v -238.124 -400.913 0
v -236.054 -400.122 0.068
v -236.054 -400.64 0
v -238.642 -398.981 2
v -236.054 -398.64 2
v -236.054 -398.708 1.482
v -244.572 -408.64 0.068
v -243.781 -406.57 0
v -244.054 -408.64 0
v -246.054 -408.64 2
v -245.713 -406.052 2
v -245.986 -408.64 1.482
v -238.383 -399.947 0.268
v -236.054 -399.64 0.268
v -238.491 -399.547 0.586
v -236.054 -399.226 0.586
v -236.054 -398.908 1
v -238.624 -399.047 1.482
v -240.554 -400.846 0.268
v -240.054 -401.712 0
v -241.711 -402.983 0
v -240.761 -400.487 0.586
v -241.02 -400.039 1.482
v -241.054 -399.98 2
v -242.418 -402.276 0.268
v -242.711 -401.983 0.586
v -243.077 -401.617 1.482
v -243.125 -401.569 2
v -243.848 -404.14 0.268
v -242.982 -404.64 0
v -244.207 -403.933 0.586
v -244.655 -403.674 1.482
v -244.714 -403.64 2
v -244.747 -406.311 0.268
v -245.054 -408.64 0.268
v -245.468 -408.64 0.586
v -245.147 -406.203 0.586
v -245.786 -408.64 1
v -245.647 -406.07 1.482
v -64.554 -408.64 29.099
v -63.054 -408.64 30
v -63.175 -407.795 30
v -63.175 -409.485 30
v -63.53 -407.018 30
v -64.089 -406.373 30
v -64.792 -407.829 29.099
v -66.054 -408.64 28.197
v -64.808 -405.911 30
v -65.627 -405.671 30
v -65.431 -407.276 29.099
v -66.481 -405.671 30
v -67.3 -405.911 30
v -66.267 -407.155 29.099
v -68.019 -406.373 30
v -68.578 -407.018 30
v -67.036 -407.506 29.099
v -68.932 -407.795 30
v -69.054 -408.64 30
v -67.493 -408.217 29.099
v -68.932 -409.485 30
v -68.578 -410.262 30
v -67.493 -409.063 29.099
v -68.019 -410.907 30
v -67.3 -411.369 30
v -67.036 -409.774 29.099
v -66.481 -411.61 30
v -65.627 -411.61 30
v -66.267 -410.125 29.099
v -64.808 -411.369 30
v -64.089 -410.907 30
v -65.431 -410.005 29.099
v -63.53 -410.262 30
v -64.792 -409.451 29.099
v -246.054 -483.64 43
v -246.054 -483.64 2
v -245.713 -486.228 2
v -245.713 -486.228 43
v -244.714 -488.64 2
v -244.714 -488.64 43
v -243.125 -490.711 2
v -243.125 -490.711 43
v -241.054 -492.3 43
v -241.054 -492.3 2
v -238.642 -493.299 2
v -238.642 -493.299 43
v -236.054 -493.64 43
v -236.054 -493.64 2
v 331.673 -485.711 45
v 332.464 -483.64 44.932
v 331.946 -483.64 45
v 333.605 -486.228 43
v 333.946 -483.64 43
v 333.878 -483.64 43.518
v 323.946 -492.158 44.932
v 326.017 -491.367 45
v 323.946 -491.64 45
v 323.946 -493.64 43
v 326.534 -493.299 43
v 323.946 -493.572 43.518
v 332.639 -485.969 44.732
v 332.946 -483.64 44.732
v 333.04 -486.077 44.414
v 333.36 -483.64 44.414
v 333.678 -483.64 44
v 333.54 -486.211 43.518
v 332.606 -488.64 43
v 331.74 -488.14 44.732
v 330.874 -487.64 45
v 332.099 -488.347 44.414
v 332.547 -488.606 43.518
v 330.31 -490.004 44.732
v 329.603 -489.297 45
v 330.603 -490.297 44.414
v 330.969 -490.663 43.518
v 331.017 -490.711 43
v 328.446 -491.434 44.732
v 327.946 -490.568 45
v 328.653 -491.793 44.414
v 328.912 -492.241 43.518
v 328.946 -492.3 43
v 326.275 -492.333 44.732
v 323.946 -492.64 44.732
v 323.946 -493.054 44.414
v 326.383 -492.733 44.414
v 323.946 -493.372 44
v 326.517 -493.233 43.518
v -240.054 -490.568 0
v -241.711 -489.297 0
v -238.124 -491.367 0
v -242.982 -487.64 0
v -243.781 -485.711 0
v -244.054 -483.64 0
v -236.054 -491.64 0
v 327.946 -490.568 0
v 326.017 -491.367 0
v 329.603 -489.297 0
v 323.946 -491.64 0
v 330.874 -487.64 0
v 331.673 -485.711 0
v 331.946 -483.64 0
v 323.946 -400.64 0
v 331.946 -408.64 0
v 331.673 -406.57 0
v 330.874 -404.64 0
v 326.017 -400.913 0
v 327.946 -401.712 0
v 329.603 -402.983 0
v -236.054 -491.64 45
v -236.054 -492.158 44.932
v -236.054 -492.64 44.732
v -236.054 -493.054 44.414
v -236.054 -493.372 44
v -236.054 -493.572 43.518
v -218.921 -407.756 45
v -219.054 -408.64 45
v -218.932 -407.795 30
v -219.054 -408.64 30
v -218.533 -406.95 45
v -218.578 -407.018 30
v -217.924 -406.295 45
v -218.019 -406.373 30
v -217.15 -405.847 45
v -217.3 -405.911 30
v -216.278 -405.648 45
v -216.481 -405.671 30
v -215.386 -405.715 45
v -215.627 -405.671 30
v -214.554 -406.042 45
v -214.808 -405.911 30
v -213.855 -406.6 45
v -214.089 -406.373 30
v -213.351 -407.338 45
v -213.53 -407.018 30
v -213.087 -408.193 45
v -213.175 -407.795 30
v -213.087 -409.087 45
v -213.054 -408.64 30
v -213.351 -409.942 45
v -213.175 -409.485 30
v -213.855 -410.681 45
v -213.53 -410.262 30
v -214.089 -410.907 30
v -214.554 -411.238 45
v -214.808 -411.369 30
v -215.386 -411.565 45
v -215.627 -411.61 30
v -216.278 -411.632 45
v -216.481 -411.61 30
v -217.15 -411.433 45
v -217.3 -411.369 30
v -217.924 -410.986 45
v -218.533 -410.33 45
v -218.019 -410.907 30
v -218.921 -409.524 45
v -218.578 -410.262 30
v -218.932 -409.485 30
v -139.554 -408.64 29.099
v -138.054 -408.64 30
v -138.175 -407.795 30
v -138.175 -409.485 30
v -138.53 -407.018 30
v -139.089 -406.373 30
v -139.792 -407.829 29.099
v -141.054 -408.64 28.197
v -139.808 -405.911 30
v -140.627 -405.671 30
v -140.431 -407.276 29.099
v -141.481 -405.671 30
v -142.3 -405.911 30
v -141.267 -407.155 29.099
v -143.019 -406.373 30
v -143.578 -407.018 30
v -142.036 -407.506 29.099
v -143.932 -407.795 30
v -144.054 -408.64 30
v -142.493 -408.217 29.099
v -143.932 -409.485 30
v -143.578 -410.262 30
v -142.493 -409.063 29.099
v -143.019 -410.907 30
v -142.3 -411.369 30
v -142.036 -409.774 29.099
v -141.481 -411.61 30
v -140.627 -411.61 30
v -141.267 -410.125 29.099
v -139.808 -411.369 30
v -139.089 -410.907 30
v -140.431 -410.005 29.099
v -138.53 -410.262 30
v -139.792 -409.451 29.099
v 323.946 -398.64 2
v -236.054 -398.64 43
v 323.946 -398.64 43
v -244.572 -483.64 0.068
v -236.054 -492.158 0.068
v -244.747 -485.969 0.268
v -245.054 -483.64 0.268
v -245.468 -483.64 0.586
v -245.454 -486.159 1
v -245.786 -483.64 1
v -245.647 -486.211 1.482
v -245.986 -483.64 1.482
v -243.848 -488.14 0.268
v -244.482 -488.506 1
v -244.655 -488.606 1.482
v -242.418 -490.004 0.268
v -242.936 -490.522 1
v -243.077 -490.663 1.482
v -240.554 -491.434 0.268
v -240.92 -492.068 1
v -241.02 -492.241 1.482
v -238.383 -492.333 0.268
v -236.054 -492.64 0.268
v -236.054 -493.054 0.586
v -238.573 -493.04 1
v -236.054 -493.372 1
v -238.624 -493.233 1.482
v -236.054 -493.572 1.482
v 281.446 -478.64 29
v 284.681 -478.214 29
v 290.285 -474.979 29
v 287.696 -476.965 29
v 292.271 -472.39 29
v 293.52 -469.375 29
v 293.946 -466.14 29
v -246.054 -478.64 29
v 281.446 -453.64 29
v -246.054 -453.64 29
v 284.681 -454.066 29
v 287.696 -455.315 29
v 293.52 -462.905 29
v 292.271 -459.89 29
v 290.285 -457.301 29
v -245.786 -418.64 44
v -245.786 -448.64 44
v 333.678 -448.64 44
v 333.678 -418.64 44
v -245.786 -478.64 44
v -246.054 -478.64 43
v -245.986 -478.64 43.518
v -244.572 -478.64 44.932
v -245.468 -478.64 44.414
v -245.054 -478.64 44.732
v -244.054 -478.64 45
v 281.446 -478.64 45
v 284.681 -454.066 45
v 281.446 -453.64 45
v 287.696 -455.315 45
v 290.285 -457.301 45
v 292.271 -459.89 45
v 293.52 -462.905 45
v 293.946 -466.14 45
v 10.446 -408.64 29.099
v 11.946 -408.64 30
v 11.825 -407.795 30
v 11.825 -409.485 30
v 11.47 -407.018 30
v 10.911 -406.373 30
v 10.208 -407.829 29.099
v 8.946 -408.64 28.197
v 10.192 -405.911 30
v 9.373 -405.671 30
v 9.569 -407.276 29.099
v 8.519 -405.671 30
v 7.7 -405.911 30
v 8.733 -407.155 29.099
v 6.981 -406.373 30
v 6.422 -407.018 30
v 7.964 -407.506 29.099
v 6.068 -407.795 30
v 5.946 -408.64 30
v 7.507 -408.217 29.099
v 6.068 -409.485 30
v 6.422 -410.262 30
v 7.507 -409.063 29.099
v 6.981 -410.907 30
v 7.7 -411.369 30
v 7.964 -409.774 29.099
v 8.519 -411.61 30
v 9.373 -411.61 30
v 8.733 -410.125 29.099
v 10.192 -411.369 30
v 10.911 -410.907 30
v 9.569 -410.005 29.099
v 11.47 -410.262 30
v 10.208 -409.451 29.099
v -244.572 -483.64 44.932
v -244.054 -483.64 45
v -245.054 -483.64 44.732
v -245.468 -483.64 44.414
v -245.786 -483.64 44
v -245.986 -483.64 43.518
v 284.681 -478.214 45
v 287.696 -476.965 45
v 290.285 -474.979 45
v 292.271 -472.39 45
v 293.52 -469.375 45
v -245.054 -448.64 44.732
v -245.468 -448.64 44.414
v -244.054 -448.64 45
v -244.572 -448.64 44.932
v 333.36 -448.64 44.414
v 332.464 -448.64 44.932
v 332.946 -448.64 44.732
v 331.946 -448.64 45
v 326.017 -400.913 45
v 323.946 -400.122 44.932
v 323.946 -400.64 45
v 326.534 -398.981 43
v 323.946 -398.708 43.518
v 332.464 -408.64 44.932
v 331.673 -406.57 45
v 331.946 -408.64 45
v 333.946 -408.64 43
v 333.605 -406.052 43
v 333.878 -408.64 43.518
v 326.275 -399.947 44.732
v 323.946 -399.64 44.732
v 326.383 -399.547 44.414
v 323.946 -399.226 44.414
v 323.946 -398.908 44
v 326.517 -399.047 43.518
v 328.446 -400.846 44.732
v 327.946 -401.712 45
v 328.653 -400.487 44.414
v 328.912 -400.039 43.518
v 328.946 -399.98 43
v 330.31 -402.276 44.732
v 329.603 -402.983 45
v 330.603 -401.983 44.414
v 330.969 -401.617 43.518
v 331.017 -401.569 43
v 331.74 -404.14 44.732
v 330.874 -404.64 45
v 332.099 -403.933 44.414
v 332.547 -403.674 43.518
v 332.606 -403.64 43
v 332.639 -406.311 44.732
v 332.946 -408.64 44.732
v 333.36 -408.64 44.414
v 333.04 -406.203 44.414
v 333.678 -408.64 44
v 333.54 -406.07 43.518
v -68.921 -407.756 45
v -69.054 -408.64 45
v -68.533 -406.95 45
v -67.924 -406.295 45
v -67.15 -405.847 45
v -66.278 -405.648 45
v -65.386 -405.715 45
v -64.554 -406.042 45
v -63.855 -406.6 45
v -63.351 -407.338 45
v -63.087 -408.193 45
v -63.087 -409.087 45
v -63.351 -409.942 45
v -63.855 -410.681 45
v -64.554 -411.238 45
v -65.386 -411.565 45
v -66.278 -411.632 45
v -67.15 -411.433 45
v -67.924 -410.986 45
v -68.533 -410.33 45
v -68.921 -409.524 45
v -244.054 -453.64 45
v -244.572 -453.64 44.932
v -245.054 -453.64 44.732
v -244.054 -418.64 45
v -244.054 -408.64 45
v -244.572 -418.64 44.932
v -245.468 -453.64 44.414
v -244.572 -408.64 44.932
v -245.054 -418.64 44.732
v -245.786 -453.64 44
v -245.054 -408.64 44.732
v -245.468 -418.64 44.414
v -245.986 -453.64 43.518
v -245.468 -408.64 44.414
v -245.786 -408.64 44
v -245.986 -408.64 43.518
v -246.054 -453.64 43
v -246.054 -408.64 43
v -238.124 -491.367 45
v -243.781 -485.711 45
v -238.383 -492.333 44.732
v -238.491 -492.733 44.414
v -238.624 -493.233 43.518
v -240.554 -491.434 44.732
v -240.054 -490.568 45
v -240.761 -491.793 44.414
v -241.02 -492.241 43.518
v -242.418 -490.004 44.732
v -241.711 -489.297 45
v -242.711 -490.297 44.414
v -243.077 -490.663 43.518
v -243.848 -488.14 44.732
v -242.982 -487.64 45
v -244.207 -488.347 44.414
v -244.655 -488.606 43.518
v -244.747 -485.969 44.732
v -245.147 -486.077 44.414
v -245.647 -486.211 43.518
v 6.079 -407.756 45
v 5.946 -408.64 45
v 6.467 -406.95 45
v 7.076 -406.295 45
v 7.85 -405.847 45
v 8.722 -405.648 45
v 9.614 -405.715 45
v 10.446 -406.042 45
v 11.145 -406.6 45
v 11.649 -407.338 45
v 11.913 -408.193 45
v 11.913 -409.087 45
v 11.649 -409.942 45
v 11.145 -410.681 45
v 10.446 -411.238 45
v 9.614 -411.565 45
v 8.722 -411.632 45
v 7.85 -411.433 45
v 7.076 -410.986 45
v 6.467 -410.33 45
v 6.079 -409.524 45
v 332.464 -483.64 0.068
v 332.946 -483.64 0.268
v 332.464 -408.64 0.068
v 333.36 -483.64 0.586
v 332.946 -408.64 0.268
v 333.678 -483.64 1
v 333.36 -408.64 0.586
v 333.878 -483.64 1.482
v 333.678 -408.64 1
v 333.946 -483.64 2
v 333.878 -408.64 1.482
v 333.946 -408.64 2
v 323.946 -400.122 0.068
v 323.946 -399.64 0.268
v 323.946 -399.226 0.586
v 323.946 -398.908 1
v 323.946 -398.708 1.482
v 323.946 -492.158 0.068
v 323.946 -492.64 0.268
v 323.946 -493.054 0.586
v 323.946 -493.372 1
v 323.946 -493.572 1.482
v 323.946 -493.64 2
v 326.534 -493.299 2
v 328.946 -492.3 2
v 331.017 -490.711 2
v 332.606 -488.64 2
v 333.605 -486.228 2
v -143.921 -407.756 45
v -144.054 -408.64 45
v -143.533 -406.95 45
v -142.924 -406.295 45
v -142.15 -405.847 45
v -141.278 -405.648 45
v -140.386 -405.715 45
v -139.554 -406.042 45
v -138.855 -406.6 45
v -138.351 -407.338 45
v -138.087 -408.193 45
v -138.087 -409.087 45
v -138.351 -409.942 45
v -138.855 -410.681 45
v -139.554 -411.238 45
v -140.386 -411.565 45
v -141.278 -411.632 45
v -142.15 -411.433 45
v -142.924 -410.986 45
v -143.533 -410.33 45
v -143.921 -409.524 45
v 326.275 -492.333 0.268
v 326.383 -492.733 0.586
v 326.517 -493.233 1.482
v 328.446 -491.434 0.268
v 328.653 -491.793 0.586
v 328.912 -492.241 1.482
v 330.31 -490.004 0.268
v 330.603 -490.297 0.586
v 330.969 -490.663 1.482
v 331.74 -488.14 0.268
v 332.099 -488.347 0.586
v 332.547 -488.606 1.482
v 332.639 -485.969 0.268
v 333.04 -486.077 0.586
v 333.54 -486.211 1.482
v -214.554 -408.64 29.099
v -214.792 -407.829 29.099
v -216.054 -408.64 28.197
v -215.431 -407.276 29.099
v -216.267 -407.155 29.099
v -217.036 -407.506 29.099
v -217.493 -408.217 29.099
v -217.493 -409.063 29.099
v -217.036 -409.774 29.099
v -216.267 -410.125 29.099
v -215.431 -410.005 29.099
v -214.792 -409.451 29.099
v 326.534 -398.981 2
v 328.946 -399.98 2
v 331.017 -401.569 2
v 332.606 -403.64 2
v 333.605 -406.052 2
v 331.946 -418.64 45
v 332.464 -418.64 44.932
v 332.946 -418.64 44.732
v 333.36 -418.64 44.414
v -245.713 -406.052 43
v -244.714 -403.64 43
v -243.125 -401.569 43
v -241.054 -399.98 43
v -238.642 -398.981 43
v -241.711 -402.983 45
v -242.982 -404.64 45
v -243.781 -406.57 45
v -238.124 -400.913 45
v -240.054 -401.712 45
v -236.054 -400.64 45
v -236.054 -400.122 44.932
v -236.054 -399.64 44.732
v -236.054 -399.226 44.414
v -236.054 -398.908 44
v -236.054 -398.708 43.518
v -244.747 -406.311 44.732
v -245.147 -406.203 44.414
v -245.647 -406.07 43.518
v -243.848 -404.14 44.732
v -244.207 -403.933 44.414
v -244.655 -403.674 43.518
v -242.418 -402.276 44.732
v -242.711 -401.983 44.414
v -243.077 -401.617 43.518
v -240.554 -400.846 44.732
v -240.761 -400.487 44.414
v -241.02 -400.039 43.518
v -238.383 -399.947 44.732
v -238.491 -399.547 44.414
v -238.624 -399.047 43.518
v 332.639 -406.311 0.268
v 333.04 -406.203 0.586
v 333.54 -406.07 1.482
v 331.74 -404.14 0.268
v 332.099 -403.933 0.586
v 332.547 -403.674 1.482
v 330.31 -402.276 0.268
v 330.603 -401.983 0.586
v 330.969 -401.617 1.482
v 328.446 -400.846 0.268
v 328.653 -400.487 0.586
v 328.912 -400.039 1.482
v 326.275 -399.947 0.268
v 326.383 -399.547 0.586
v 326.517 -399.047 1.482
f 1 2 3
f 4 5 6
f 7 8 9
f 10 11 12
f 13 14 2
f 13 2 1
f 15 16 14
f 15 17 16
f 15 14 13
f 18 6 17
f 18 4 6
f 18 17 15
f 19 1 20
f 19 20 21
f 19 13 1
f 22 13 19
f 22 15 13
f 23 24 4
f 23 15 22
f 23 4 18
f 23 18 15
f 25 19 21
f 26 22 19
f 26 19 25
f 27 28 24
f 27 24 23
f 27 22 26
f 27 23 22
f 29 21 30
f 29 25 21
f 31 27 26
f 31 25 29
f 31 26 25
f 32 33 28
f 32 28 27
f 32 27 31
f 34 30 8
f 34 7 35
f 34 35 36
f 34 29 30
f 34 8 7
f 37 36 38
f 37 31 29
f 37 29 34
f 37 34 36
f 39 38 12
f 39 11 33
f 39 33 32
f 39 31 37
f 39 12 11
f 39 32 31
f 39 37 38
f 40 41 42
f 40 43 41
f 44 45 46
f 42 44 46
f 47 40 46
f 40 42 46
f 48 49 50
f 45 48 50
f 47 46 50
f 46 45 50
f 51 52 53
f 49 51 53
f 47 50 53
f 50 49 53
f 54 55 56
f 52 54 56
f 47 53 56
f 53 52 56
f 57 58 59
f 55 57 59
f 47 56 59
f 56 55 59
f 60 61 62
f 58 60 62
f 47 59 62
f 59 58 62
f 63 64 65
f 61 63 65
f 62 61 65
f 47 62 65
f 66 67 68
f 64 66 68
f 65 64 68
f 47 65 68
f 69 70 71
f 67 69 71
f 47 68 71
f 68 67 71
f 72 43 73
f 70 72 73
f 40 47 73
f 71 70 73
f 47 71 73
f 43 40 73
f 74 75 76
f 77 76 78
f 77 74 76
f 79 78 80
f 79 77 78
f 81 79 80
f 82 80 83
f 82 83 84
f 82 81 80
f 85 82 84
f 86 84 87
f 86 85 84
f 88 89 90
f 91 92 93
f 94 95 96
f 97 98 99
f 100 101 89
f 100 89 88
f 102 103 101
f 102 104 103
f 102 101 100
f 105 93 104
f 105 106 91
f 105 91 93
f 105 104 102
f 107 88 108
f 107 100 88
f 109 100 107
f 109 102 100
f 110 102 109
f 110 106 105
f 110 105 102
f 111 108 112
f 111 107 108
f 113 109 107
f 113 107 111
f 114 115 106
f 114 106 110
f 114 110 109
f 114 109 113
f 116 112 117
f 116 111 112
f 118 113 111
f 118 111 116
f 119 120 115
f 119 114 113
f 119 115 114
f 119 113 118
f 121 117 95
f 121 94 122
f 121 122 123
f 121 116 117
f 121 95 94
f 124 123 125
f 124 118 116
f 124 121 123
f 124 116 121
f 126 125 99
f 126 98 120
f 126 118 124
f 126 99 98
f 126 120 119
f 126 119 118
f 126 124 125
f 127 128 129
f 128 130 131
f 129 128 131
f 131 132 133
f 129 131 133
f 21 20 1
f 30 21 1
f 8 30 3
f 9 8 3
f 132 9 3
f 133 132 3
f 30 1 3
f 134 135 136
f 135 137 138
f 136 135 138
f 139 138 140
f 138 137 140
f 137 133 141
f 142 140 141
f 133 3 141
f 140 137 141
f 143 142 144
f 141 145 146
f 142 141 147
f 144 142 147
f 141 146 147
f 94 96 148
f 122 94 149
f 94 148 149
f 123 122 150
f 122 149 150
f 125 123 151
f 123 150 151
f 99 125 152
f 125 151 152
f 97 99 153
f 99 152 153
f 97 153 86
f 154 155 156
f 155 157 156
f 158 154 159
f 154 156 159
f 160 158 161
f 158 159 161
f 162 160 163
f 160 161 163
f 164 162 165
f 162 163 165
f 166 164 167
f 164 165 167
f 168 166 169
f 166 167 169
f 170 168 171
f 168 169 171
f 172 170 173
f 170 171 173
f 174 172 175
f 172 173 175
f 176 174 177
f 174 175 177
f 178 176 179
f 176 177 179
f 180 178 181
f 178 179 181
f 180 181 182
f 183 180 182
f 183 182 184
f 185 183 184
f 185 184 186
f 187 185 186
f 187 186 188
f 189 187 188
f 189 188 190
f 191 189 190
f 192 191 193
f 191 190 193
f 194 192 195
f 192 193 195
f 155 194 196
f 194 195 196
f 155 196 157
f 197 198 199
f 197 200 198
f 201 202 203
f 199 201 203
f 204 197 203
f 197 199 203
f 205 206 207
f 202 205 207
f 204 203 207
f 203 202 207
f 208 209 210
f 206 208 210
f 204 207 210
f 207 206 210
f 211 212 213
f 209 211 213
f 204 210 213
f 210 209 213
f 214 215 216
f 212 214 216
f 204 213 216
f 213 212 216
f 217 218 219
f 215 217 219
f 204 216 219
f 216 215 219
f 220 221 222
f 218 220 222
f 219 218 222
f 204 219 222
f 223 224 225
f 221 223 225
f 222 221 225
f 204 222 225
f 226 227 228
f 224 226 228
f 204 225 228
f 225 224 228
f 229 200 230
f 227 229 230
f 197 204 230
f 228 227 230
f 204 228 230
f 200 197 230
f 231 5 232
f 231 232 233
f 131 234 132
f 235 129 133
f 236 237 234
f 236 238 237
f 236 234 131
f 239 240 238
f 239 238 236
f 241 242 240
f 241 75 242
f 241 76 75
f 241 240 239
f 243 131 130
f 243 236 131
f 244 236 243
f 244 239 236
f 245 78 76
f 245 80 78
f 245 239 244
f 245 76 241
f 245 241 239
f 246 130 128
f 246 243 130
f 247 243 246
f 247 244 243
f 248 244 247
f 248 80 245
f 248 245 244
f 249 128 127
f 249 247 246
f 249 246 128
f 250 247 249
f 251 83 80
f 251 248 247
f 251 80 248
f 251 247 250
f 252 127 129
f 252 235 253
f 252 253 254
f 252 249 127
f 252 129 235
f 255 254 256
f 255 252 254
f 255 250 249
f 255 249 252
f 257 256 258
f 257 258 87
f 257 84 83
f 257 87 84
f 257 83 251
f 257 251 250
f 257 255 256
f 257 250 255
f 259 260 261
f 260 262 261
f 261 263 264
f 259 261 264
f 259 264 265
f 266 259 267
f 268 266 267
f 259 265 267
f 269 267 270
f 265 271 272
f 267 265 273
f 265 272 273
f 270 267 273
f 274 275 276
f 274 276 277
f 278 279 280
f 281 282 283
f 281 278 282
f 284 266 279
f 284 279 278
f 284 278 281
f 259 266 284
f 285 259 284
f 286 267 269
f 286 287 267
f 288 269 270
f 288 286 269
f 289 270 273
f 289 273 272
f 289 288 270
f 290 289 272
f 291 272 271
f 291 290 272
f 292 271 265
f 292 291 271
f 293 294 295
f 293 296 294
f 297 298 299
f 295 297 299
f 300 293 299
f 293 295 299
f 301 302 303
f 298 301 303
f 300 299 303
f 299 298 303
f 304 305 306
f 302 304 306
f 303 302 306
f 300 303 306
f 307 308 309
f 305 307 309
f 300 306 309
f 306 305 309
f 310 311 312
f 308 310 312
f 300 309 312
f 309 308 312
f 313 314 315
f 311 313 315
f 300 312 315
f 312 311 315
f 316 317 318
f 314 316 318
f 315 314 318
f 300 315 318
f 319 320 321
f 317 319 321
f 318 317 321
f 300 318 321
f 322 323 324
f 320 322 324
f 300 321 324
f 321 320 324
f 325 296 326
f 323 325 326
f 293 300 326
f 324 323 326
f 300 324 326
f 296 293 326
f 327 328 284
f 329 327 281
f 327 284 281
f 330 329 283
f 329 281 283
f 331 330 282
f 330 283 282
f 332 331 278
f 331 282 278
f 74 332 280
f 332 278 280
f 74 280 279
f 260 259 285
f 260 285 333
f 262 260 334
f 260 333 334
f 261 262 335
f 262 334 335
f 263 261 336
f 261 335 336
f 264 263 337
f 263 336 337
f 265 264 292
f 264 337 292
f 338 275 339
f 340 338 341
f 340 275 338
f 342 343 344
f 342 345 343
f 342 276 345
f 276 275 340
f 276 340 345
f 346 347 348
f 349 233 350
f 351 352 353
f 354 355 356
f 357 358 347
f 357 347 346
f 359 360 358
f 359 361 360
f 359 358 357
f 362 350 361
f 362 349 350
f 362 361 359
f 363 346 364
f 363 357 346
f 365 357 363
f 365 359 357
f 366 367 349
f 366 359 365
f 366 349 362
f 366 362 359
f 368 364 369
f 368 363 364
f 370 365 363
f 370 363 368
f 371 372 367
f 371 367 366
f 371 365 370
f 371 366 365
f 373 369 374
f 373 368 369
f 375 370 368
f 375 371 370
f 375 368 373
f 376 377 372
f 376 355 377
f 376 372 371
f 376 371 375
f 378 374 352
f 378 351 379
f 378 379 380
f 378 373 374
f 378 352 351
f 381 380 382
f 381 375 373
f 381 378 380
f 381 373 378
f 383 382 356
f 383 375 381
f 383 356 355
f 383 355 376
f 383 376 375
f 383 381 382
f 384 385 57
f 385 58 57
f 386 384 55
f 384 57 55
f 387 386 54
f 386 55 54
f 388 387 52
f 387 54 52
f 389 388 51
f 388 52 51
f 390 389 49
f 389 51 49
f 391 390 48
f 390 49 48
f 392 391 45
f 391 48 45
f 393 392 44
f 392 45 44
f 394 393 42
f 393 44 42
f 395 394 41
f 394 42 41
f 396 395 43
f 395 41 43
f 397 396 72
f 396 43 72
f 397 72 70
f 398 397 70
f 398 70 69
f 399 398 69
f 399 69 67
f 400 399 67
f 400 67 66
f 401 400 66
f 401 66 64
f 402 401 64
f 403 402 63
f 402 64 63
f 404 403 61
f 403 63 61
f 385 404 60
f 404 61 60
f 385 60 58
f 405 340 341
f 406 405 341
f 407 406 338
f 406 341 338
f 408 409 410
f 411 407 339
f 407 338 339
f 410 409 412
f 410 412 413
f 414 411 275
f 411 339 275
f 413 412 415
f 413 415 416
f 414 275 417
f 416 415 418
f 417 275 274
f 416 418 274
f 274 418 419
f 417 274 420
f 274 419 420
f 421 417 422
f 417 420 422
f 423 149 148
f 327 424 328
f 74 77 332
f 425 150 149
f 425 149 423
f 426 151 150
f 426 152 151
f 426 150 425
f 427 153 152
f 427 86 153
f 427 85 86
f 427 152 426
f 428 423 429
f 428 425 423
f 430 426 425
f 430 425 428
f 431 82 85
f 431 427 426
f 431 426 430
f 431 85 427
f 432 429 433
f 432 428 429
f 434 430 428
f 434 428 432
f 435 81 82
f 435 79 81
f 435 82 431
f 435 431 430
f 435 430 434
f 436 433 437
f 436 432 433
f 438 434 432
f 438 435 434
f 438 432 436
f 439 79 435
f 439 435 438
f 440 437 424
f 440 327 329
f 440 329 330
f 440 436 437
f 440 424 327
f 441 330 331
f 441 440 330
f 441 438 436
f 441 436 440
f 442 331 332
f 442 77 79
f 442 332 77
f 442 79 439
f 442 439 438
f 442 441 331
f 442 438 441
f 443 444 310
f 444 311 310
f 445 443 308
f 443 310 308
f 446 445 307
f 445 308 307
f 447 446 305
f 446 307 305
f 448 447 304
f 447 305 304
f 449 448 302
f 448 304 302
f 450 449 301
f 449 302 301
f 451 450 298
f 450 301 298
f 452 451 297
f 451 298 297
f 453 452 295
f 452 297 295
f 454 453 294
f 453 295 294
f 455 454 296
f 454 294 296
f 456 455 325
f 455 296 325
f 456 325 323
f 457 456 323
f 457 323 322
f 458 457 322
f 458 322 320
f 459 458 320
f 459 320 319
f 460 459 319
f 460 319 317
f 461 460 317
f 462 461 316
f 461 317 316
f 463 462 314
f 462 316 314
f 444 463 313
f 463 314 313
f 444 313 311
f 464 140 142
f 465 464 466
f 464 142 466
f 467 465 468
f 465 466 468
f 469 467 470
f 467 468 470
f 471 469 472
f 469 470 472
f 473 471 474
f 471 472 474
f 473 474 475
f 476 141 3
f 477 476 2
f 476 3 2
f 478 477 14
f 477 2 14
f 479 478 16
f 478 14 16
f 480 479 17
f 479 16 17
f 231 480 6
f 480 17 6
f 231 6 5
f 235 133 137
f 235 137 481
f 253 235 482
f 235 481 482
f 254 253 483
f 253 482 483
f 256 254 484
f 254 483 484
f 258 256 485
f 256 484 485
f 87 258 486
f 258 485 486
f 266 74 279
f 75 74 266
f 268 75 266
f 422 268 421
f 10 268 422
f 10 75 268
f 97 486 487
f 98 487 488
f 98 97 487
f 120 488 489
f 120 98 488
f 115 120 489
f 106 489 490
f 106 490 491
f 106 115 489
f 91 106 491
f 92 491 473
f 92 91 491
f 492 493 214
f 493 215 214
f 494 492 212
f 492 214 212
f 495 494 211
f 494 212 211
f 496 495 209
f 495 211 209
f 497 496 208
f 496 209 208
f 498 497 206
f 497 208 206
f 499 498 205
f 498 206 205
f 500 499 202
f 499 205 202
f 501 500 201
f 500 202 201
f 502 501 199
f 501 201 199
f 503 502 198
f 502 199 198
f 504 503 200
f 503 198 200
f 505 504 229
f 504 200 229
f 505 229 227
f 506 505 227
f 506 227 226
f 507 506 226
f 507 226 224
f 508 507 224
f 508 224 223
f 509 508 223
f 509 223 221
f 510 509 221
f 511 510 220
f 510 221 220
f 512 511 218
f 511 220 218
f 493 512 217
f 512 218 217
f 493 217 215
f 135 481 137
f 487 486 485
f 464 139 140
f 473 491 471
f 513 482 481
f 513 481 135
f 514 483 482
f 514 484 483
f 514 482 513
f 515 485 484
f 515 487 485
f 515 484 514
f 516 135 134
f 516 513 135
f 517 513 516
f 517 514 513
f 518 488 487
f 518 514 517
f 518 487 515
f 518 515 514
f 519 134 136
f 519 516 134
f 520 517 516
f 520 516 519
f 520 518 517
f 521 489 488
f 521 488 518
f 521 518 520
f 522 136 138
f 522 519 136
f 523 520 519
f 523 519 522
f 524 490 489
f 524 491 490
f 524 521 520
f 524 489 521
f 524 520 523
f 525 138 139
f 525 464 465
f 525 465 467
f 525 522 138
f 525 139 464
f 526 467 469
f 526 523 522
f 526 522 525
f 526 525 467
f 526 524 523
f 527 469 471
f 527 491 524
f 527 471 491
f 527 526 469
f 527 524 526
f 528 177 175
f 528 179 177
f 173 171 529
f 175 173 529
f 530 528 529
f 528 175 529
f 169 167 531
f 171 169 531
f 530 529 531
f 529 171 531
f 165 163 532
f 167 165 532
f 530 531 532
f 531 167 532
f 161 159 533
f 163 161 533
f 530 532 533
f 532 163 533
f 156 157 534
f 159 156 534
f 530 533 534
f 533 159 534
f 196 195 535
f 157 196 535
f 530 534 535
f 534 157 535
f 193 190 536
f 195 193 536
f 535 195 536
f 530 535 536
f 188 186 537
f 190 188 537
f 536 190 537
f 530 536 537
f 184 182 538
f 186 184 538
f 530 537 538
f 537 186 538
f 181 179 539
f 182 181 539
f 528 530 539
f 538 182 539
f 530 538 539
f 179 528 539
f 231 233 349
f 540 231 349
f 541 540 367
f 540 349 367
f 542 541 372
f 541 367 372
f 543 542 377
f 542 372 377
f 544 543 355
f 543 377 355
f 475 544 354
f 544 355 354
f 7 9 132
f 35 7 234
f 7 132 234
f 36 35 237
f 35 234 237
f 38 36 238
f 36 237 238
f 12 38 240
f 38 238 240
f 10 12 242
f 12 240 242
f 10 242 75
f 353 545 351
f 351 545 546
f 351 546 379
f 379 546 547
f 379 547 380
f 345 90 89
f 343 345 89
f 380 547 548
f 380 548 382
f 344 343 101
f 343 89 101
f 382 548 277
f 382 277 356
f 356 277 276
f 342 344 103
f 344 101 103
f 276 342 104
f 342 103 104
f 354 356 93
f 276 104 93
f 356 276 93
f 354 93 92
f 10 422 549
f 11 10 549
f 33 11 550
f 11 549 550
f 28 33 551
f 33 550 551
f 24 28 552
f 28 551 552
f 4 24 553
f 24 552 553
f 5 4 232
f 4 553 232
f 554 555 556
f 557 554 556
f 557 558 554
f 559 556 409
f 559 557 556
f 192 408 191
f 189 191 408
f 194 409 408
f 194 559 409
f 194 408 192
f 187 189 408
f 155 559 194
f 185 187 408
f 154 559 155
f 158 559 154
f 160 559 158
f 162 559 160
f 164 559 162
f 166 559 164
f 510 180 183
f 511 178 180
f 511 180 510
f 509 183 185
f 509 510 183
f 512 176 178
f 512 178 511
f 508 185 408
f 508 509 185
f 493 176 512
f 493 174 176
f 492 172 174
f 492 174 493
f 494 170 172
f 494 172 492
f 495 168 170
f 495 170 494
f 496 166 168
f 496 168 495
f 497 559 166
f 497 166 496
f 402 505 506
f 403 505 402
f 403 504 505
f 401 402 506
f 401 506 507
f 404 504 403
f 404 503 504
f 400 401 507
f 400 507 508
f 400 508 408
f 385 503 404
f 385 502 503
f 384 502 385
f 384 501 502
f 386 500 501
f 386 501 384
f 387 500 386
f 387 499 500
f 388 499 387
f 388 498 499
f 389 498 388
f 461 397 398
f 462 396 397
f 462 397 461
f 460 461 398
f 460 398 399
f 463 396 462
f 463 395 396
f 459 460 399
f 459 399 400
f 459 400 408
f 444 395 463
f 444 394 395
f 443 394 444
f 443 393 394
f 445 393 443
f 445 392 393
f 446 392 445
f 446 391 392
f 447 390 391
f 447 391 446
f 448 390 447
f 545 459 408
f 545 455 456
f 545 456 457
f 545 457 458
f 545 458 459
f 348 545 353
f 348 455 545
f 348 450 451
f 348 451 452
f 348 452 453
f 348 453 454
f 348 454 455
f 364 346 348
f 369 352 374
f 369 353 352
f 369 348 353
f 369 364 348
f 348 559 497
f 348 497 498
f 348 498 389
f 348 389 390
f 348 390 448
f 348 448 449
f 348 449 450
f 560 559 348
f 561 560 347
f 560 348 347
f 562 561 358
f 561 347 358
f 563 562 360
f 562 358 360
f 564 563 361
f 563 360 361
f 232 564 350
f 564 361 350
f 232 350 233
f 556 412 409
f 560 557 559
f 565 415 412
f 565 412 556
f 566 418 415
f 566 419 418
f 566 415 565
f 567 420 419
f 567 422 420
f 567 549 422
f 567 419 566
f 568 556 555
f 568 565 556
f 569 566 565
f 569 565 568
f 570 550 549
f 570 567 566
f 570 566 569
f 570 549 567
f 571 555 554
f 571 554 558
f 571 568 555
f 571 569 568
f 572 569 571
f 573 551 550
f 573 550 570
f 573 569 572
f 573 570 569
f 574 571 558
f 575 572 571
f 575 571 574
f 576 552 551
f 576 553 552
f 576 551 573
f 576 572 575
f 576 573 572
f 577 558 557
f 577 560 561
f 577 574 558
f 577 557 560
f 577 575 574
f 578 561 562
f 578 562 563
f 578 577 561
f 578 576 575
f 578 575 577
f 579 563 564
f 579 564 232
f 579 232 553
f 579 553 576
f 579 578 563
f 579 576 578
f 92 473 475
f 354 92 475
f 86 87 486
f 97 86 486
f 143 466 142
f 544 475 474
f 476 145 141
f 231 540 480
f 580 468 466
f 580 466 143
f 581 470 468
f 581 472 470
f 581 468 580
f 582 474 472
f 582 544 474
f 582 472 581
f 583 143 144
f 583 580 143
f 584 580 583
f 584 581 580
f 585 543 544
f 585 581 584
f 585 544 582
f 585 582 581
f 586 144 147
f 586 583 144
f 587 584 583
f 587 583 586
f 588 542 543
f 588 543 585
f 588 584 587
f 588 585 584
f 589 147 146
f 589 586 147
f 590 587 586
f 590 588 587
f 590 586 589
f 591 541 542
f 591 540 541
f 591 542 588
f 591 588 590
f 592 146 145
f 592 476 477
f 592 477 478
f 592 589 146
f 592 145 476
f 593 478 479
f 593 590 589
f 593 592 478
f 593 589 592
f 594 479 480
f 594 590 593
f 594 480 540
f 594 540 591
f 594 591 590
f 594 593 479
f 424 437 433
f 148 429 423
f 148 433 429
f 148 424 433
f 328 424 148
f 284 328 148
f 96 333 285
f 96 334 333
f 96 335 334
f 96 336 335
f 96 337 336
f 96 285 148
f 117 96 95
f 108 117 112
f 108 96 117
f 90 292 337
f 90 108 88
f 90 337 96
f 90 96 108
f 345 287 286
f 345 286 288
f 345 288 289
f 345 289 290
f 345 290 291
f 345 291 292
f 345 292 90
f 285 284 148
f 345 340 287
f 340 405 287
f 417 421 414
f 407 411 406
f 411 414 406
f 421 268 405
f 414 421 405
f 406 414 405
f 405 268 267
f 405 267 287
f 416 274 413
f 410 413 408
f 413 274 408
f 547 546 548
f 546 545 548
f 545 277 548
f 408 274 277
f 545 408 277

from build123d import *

# Parameters (mm, degrees)
F0_W      = 580
F0_H      = 95
F1_DEPTH  = 45
F3_START  = -40
F2_W      = 25
F2_H      = 16
F3_DEPTH  = 540.001
F6_D      = 6
F6_DEPTH  = 15
F6_TIP    = 1.8025818571
F7_R      = 10
F8_R      = 2
F9_R      = 12.49999
F5_W      = 30
F5_H      = 1
F10_DEPTH = 580.0010001


# Not quite as in the source:
# - a fillet or chamfer is up to 0.001 mm smaller than in the source, because OpenCascade refuses the exact size


with BuildPart() as f1:
    # F0 (on Top) → F1 (new body)
    with BuildSketch(Plane.XY):
        with Locations((43.9460686967, -446.140053056)):
            Rectangle(F0_W, F0_H)
    extrude(amount=F1_DEPTH)

    # F2 (on face) → F3 (cut)
    with BuildSketch(Plane.YZ.offset(333.9460686967).offset(F3_START)):
        with Locations((-466.140053056, 37)):
            Rectangle(F2_W, F2_H)
    extrude(amount=-F3_DEPTH, mode=Mode.SUBTRACT)

    # F6
    with Locations(Plane.XY.offset(45)):
        with Locations((-216.0539313033, -408.640053056), (-141.0539313033, -408.640053056), (-66.0539313033, -408.640053056), (8.9460686967, -408.640053056)):
            Hole(F6_D / 2, depth=F6_DEPTH)
            with Locations((0, 0, -(F6_DEPTH + F6_TIP / 2))):  # 118° drill point
                Cone(0, F6_D / 2, F6_TIP, mode=Mode.SUBTRACT)

    # F7
    f7_edges = [f1.edges().sort_by_distance(p)[0] for p in [
        (-246.053931, -493.640053, 22.5),
        (333.946069, -493.640053, 22.5),
        (333.946069, -398.640053, 22.5),
        (-246.053931, -398.640053, 22.5),
    ]]
    fillet(f7_edges, radius=F7_R)

    # F8
    f8_edges = [f1.edges().sort_by_distance(p)[0] for p in [
        (43.946069, -398.640053, 45),
        (43.946069, -493.640053, 45),
        (43.946069, -493.640053, 0),
    ]]
    fillet(f8_edges, radius=F8_R)

    # F9 (radius 12.5 in the source; OpenCascade refuses exactly that, so slightly less here)
    f9_edges = [f1.edges().sort_by_distance(p)[0] for p in [
        (293.946069, -453.640053, 37),
        (293.946069, -478.640053, 37),
    ]]
    fillet(f9_edges, radius=F9_R)

    # F5 (on face) → F10 (cut, through all)
    with BuildSketch(Plane.YZ.offset(333.9460686967)):
        with Locations((-433.640053056, 44.5)):
            Rectangle(F5_W, F5_H)
    extrude(amount=-F10_DEPTH, mode=Mode.SUBTRACT)


solid = f1.part
